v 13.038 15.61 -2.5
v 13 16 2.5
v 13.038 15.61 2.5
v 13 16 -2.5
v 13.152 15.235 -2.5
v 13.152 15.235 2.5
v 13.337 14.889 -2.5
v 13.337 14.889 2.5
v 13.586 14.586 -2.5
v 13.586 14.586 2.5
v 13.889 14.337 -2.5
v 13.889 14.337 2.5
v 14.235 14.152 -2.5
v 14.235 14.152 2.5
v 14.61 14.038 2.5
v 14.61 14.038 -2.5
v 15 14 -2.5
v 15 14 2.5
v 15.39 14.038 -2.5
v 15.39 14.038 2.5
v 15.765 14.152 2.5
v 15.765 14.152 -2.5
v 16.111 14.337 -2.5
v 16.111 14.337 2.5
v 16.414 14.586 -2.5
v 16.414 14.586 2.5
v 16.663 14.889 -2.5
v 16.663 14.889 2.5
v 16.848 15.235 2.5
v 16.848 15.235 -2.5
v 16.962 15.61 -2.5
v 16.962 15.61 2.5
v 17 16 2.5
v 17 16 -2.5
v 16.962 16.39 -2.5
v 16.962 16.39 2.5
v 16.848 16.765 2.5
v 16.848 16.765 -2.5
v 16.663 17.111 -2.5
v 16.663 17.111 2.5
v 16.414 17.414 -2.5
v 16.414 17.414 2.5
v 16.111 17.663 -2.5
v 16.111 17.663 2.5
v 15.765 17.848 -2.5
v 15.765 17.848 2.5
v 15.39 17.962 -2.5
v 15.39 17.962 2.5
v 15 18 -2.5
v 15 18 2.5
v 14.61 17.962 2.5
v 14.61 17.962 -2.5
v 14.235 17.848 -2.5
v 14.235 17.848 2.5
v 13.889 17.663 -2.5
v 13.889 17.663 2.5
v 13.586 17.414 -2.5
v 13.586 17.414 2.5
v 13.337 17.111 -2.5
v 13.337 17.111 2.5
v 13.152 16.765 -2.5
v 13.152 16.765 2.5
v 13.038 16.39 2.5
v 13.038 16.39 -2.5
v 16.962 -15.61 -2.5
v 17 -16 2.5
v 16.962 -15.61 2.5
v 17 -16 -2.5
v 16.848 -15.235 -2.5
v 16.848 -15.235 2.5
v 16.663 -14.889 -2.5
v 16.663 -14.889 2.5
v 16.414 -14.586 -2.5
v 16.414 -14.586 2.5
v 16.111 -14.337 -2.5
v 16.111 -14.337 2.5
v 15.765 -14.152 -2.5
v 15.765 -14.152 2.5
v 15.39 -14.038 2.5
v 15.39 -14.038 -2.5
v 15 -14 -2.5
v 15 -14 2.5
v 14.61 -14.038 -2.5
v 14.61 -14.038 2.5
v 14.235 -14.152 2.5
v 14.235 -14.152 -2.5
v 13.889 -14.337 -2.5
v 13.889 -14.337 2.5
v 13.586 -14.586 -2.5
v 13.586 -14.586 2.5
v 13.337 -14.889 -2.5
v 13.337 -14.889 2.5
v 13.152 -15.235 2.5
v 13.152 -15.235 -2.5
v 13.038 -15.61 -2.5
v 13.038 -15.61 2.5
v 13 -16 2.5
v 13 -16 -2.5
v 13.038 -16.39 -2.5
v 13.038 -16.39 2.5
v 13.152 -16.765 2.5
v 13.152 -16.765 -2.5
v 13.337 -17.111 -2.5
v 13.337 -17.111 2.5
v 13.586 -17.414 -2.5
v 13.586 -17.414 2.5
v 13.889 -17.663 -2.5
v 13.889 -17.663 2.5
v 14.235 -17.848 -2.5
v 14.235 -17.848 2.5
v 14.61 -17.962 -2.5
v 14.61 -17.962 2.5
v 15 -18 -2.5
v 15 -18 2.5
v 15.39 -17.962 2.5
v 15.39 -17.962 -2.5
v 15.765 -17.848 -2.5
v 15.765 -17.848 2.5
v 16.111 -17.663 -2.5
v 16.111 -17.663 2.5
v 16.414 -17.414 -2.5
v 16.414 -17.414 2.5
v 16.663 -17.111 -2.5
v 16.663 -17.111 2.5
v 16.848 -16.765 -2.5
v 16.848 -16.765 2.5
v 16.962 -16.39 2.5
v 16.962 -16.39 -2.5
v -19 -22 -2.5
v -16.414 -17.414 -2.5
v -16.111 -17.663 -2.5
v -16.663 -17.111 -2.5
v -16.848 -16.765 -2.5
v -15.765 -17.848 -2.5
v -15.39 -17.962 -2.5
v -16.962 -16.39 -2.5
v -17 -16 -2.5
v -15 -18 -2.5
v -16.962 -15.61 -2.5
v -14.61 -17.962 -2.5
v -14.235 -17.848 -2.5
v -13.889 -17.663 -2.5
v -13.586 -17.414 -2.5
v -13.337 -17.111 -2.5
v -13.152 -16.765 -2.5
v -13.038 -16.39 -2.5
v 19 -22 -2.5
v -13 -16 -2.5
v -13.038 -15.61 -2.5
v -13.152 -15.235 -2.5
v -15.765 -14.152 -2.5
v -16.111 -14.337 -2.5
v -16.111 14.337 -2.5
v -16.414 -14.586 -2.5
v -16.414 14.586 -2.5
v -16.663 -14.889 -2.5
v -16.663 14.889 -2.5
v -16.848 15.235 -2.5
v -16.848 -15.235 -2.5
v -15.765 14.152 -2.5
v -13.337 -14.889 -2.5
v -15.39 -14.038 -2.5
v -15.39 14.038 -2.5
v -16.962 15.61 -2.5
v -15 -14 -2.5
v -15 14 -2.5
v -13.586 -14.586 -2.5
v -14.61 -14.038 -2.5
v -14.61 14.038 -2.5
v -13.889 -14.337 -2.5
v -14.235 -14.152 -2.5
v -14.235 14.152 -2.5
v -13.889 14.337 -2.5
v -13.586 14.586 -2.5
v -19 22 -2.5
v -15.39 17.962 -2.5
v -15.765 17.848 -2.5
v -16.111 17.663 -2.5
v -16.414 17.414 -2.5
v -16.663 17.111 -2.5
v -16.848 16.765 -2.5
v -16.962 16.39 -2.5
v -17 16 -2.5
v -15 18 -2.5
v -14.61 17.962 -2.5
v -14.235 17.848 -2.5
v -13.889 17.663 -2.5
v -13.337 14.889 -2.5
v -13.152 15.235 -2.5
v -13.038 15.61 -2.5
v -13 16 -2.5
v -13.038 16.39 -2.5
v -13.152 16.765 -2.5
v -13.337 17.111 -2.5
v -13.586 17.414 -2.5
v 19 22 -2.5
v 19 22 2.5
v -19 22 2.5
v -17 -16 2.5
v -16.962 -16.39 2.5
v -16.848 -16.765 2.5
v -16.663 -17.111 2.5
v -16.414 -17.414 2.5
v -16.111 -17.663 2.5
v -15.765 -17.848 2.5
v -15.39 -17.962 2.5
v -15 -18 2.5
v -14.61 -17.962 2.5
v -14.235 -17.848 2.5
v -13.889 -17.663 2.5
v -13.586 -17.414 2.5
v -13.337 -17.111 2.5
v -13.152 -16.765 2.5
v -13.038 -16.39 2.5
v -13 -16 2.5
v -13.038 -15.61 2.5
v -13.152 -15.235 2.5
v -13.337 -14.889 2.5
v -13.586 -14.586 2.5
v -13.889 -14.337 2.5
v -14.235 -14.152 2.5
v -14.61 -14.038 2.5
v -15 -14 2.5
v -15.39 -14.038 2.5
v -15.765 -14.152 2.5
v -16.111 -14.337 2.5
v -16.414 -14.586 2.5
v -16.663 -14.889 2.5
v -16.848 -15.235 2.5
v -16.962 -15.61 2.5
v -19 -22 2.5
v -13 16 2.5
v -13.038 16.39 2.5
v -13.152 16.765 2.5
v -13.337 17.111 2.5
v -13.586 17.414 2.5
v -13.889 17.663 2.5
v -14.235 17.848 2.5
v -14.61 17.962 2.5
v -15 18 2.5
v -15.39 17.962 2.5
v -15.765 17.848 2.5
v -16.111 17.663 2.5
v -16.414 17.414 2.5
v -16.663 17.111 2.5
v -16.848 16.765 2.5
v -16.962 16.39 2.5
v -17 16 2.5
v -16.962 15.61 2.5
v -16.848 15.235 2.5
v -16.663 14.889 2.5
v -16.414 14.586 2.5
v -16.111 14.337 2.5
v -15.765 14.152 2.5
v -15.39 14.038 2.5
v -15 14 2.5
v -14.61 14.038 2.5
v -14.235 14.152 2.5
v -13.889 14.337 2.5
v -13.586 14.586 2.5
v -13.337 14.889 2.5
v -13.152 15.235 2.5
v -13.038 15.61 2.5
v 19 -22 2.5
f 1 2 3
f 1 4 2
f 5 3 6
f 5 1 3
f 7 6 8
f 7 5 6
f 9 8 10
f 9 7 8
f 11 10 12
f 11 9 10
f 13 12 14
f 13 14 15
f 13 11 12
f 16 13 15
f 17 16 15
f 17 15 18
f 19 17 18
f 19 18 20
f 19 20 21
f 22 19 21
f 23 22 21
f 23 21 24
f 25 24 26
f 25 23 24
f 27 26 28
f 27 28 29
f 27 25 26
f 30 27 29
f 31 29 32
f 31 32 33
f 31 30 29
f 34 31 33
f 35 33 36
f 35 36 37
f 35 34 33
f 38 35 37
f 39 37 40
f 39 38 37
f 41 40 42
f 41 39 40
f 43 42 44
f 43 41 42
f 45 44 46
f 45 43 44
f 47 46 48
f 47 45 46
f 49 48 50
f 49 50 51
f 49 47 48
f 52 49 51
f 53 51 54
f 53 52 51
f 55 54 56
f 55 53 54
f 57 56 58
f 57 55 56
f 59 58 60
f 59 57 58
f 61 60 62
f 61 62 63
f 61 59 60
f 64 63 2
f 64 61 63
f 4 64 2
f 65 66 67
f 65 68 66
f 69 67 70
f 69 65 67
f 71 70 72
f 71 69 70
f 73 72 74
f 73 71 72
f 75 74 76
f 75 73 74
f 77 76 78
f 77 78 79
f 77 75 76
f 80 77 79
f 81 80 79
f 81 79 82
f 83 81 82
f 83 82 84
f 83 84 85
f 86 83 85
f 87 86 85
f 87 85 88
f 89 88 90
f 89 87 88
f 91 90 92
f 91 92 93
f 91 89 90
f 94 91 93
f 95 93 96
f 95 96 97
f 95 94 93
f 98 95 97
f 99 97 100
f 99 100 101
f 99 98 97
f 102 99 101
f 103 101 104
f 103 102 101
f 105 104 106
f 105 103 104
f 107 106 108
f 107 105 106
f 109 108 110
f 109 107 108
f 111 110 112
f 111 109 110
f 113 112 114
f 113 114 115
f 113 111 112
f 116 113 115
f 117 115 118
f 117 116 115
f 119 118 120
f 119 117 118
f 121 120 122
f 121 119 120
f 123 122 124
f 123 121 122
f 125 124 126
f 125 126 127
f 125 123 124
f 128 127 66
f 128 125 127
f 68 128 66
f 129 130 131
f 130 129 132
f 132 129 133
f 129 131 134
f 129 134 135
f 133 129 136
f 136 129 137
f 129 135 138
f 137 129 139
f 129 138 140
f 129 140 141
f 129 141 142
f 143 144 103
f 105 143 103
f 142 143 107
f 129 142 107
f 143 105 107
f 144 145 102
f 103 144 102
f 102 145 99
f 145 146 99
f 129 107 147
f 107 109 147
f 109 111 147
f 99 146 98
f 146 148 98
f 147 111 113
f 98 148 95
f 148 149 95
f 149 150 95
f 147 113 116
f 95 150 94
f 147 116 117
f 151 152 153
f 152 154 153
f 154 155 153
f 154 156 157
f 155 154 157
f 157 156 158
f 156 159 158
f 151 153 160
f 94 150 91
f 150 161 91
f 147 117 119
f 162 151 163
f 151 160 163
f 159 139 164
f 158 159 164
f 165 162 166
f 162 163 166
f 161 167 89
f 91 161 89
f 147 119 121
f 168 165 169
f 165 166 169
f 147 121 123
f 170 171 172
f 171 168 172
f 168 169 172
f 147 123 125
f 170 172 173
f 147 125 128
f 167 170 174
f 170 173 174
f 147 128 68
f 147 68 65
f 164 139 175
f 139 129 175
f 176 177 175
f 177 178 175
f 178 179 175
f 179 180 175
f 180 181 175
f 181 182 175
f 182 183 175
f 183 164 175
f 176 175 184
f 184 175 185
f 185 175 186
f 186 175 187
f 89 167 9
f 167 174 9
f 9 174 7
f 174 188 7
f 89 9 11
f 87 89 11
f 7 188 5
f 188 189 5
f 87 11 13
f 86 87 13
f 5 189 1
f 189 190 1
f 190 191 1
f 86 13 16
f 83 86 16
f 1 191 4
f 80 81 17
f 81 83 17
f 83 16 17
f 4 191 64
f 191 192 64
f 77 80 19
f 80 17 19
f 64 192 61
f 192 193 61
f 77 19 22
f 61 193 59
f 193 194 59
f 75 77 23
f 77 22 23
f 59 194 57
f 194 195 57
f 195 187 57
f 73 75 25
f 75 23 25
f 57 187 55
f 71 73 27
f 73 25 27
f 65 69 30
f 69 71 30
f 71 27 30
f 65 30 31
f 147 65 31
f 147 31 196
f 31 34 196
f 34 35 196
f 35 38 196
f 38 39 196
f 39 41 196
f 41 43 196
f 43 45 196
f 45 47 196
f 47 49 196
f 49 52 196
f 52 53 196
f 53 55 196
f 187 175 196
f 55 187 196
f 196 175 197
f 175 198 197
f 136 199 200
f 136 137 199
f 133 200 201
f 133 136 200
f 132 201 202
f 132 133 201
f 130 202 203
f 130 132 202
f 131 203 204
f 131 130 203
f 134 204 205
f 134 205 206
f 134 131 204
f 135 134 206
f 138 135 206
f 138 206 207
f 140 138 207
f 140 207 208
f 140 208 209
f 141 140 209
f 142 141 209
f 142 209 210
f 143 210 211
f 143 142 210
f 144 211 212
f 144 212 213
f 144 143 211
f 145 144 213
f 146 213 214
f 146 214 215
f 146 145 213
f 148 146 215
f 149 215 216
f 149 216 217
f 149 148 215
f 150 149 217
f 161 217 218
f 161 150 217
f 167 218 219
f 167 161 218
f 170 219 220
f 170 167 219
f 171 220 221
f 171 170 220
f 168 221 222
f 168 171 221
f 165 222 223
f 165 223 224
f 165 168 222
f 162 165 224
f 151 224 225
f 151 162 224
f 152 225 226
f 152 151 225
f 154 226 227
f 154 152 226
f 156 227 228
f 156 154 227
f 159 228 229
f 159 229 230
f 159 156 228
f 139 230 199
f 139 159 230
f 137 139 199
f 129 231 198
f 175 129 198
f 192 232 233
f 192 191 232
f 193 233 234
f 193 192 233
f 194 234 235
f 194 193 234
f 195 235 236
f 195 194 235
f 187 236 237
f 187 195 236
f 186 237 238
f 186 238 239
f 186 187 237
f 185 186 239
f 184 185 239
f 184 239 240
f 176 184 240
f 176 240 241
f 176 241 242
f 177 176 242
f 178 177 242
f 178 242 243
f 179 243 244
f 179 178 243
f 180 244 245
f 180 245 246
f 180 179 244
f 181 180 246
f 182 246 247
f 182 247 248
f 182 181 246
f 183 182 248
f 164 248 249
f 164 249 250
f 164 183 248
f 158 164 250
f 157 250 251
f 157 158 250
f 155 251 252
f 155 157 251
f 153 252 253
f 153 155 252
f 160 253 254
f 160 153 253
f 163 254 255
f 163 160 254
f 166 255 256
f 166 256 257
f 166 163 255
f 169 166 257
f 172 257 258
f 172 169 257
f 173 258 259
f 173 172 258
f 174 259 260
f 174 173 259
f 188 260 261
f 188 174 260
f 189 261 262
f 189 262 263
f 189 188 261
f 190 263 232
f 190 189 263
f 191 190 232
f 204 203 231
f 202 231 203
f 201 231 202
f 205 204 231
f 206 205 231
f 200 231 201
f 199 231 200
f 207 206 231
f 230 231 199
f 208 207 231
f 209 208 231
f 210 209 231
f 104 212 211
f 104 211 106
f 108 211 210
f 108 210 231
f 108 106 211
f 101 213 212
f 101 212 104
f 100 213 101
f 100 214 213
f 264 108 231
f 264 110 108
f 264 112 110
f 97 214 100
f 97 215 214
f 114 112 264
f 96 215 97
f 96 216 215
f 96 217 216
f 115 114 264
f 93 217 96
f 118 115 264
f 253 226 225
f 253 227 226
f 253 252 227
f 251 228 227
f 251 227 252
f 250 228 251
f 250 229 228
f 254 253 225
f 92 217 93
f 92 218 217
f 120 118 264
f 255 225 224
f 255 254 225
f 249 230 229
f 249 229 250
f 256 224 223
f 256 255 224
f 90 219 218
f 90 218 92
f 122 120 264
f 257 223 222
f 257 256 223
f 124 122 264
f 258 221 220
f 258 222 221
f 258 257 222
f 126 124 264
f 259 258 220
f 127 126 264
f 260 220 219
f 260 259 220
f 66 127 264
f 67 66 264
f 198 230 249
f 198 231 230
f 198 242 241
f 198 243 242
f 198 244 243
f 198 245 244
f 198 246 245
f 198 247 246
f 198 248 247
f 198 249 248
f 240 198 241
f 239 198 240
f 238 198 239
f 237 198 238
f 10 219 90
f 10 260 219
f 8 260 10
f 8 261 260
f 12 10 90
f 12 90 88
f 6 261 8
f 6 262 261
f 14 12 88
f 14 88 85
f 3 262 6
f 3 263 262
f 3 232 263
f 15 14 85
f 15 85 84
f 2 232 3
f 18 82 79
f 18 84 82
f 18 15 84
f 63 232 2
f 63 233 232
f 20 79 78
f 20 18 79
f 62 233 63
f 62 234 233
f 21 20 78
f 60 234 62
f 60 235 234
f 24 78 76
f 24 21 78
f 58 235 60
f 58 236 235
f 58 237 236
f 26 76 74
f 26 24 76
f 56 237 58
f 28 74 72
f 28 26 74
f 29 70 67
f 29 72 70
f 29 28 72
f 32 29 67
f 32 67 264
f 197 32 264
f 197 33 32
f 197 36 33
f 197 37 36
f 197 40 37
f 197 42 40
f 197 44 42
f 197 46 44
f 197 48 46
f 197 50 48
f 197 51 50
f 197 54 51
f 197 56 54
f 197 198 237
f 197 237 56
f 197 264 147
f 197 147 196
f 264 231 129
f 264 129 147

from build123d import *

# Parameters (mm, degrees)
SKETCH1_W           = 38
SKETCH1_H           = 44
SKETCH1_R           = 2
BOSS_EXTRUDE1_DEPTH = 2.5


with BuildPart() as part:
    # Sketch1 → Boss-Extrude1 (new, symmetric)
    with BuildSketch(Plane.XY):
        Rectangle(SKETCH1_W, SKETCH1_H)
        with Locations((-15, 16)):
            Circle(SKETCH1_R, mode=Mode.SUBTRACT)
        with Locations(Location((-15, -16, 0), (0, 0, 180))):
            Circle(SKETCH1_R, mode=Mode.SUBTRACT)
        with Locations((15, -16)):
            Circle(SKETCH1_R, mode=Mode.SUBTRACT)
        with Locations(Location((15, 16, 0), (0, 0, 180))):
            Circle(SKETCH1_R, mode=Mode.SUBTRACT)
    extrude(amount=BOSS_EXTRUDE1_DEPTH, both=True)


solid = part.part
